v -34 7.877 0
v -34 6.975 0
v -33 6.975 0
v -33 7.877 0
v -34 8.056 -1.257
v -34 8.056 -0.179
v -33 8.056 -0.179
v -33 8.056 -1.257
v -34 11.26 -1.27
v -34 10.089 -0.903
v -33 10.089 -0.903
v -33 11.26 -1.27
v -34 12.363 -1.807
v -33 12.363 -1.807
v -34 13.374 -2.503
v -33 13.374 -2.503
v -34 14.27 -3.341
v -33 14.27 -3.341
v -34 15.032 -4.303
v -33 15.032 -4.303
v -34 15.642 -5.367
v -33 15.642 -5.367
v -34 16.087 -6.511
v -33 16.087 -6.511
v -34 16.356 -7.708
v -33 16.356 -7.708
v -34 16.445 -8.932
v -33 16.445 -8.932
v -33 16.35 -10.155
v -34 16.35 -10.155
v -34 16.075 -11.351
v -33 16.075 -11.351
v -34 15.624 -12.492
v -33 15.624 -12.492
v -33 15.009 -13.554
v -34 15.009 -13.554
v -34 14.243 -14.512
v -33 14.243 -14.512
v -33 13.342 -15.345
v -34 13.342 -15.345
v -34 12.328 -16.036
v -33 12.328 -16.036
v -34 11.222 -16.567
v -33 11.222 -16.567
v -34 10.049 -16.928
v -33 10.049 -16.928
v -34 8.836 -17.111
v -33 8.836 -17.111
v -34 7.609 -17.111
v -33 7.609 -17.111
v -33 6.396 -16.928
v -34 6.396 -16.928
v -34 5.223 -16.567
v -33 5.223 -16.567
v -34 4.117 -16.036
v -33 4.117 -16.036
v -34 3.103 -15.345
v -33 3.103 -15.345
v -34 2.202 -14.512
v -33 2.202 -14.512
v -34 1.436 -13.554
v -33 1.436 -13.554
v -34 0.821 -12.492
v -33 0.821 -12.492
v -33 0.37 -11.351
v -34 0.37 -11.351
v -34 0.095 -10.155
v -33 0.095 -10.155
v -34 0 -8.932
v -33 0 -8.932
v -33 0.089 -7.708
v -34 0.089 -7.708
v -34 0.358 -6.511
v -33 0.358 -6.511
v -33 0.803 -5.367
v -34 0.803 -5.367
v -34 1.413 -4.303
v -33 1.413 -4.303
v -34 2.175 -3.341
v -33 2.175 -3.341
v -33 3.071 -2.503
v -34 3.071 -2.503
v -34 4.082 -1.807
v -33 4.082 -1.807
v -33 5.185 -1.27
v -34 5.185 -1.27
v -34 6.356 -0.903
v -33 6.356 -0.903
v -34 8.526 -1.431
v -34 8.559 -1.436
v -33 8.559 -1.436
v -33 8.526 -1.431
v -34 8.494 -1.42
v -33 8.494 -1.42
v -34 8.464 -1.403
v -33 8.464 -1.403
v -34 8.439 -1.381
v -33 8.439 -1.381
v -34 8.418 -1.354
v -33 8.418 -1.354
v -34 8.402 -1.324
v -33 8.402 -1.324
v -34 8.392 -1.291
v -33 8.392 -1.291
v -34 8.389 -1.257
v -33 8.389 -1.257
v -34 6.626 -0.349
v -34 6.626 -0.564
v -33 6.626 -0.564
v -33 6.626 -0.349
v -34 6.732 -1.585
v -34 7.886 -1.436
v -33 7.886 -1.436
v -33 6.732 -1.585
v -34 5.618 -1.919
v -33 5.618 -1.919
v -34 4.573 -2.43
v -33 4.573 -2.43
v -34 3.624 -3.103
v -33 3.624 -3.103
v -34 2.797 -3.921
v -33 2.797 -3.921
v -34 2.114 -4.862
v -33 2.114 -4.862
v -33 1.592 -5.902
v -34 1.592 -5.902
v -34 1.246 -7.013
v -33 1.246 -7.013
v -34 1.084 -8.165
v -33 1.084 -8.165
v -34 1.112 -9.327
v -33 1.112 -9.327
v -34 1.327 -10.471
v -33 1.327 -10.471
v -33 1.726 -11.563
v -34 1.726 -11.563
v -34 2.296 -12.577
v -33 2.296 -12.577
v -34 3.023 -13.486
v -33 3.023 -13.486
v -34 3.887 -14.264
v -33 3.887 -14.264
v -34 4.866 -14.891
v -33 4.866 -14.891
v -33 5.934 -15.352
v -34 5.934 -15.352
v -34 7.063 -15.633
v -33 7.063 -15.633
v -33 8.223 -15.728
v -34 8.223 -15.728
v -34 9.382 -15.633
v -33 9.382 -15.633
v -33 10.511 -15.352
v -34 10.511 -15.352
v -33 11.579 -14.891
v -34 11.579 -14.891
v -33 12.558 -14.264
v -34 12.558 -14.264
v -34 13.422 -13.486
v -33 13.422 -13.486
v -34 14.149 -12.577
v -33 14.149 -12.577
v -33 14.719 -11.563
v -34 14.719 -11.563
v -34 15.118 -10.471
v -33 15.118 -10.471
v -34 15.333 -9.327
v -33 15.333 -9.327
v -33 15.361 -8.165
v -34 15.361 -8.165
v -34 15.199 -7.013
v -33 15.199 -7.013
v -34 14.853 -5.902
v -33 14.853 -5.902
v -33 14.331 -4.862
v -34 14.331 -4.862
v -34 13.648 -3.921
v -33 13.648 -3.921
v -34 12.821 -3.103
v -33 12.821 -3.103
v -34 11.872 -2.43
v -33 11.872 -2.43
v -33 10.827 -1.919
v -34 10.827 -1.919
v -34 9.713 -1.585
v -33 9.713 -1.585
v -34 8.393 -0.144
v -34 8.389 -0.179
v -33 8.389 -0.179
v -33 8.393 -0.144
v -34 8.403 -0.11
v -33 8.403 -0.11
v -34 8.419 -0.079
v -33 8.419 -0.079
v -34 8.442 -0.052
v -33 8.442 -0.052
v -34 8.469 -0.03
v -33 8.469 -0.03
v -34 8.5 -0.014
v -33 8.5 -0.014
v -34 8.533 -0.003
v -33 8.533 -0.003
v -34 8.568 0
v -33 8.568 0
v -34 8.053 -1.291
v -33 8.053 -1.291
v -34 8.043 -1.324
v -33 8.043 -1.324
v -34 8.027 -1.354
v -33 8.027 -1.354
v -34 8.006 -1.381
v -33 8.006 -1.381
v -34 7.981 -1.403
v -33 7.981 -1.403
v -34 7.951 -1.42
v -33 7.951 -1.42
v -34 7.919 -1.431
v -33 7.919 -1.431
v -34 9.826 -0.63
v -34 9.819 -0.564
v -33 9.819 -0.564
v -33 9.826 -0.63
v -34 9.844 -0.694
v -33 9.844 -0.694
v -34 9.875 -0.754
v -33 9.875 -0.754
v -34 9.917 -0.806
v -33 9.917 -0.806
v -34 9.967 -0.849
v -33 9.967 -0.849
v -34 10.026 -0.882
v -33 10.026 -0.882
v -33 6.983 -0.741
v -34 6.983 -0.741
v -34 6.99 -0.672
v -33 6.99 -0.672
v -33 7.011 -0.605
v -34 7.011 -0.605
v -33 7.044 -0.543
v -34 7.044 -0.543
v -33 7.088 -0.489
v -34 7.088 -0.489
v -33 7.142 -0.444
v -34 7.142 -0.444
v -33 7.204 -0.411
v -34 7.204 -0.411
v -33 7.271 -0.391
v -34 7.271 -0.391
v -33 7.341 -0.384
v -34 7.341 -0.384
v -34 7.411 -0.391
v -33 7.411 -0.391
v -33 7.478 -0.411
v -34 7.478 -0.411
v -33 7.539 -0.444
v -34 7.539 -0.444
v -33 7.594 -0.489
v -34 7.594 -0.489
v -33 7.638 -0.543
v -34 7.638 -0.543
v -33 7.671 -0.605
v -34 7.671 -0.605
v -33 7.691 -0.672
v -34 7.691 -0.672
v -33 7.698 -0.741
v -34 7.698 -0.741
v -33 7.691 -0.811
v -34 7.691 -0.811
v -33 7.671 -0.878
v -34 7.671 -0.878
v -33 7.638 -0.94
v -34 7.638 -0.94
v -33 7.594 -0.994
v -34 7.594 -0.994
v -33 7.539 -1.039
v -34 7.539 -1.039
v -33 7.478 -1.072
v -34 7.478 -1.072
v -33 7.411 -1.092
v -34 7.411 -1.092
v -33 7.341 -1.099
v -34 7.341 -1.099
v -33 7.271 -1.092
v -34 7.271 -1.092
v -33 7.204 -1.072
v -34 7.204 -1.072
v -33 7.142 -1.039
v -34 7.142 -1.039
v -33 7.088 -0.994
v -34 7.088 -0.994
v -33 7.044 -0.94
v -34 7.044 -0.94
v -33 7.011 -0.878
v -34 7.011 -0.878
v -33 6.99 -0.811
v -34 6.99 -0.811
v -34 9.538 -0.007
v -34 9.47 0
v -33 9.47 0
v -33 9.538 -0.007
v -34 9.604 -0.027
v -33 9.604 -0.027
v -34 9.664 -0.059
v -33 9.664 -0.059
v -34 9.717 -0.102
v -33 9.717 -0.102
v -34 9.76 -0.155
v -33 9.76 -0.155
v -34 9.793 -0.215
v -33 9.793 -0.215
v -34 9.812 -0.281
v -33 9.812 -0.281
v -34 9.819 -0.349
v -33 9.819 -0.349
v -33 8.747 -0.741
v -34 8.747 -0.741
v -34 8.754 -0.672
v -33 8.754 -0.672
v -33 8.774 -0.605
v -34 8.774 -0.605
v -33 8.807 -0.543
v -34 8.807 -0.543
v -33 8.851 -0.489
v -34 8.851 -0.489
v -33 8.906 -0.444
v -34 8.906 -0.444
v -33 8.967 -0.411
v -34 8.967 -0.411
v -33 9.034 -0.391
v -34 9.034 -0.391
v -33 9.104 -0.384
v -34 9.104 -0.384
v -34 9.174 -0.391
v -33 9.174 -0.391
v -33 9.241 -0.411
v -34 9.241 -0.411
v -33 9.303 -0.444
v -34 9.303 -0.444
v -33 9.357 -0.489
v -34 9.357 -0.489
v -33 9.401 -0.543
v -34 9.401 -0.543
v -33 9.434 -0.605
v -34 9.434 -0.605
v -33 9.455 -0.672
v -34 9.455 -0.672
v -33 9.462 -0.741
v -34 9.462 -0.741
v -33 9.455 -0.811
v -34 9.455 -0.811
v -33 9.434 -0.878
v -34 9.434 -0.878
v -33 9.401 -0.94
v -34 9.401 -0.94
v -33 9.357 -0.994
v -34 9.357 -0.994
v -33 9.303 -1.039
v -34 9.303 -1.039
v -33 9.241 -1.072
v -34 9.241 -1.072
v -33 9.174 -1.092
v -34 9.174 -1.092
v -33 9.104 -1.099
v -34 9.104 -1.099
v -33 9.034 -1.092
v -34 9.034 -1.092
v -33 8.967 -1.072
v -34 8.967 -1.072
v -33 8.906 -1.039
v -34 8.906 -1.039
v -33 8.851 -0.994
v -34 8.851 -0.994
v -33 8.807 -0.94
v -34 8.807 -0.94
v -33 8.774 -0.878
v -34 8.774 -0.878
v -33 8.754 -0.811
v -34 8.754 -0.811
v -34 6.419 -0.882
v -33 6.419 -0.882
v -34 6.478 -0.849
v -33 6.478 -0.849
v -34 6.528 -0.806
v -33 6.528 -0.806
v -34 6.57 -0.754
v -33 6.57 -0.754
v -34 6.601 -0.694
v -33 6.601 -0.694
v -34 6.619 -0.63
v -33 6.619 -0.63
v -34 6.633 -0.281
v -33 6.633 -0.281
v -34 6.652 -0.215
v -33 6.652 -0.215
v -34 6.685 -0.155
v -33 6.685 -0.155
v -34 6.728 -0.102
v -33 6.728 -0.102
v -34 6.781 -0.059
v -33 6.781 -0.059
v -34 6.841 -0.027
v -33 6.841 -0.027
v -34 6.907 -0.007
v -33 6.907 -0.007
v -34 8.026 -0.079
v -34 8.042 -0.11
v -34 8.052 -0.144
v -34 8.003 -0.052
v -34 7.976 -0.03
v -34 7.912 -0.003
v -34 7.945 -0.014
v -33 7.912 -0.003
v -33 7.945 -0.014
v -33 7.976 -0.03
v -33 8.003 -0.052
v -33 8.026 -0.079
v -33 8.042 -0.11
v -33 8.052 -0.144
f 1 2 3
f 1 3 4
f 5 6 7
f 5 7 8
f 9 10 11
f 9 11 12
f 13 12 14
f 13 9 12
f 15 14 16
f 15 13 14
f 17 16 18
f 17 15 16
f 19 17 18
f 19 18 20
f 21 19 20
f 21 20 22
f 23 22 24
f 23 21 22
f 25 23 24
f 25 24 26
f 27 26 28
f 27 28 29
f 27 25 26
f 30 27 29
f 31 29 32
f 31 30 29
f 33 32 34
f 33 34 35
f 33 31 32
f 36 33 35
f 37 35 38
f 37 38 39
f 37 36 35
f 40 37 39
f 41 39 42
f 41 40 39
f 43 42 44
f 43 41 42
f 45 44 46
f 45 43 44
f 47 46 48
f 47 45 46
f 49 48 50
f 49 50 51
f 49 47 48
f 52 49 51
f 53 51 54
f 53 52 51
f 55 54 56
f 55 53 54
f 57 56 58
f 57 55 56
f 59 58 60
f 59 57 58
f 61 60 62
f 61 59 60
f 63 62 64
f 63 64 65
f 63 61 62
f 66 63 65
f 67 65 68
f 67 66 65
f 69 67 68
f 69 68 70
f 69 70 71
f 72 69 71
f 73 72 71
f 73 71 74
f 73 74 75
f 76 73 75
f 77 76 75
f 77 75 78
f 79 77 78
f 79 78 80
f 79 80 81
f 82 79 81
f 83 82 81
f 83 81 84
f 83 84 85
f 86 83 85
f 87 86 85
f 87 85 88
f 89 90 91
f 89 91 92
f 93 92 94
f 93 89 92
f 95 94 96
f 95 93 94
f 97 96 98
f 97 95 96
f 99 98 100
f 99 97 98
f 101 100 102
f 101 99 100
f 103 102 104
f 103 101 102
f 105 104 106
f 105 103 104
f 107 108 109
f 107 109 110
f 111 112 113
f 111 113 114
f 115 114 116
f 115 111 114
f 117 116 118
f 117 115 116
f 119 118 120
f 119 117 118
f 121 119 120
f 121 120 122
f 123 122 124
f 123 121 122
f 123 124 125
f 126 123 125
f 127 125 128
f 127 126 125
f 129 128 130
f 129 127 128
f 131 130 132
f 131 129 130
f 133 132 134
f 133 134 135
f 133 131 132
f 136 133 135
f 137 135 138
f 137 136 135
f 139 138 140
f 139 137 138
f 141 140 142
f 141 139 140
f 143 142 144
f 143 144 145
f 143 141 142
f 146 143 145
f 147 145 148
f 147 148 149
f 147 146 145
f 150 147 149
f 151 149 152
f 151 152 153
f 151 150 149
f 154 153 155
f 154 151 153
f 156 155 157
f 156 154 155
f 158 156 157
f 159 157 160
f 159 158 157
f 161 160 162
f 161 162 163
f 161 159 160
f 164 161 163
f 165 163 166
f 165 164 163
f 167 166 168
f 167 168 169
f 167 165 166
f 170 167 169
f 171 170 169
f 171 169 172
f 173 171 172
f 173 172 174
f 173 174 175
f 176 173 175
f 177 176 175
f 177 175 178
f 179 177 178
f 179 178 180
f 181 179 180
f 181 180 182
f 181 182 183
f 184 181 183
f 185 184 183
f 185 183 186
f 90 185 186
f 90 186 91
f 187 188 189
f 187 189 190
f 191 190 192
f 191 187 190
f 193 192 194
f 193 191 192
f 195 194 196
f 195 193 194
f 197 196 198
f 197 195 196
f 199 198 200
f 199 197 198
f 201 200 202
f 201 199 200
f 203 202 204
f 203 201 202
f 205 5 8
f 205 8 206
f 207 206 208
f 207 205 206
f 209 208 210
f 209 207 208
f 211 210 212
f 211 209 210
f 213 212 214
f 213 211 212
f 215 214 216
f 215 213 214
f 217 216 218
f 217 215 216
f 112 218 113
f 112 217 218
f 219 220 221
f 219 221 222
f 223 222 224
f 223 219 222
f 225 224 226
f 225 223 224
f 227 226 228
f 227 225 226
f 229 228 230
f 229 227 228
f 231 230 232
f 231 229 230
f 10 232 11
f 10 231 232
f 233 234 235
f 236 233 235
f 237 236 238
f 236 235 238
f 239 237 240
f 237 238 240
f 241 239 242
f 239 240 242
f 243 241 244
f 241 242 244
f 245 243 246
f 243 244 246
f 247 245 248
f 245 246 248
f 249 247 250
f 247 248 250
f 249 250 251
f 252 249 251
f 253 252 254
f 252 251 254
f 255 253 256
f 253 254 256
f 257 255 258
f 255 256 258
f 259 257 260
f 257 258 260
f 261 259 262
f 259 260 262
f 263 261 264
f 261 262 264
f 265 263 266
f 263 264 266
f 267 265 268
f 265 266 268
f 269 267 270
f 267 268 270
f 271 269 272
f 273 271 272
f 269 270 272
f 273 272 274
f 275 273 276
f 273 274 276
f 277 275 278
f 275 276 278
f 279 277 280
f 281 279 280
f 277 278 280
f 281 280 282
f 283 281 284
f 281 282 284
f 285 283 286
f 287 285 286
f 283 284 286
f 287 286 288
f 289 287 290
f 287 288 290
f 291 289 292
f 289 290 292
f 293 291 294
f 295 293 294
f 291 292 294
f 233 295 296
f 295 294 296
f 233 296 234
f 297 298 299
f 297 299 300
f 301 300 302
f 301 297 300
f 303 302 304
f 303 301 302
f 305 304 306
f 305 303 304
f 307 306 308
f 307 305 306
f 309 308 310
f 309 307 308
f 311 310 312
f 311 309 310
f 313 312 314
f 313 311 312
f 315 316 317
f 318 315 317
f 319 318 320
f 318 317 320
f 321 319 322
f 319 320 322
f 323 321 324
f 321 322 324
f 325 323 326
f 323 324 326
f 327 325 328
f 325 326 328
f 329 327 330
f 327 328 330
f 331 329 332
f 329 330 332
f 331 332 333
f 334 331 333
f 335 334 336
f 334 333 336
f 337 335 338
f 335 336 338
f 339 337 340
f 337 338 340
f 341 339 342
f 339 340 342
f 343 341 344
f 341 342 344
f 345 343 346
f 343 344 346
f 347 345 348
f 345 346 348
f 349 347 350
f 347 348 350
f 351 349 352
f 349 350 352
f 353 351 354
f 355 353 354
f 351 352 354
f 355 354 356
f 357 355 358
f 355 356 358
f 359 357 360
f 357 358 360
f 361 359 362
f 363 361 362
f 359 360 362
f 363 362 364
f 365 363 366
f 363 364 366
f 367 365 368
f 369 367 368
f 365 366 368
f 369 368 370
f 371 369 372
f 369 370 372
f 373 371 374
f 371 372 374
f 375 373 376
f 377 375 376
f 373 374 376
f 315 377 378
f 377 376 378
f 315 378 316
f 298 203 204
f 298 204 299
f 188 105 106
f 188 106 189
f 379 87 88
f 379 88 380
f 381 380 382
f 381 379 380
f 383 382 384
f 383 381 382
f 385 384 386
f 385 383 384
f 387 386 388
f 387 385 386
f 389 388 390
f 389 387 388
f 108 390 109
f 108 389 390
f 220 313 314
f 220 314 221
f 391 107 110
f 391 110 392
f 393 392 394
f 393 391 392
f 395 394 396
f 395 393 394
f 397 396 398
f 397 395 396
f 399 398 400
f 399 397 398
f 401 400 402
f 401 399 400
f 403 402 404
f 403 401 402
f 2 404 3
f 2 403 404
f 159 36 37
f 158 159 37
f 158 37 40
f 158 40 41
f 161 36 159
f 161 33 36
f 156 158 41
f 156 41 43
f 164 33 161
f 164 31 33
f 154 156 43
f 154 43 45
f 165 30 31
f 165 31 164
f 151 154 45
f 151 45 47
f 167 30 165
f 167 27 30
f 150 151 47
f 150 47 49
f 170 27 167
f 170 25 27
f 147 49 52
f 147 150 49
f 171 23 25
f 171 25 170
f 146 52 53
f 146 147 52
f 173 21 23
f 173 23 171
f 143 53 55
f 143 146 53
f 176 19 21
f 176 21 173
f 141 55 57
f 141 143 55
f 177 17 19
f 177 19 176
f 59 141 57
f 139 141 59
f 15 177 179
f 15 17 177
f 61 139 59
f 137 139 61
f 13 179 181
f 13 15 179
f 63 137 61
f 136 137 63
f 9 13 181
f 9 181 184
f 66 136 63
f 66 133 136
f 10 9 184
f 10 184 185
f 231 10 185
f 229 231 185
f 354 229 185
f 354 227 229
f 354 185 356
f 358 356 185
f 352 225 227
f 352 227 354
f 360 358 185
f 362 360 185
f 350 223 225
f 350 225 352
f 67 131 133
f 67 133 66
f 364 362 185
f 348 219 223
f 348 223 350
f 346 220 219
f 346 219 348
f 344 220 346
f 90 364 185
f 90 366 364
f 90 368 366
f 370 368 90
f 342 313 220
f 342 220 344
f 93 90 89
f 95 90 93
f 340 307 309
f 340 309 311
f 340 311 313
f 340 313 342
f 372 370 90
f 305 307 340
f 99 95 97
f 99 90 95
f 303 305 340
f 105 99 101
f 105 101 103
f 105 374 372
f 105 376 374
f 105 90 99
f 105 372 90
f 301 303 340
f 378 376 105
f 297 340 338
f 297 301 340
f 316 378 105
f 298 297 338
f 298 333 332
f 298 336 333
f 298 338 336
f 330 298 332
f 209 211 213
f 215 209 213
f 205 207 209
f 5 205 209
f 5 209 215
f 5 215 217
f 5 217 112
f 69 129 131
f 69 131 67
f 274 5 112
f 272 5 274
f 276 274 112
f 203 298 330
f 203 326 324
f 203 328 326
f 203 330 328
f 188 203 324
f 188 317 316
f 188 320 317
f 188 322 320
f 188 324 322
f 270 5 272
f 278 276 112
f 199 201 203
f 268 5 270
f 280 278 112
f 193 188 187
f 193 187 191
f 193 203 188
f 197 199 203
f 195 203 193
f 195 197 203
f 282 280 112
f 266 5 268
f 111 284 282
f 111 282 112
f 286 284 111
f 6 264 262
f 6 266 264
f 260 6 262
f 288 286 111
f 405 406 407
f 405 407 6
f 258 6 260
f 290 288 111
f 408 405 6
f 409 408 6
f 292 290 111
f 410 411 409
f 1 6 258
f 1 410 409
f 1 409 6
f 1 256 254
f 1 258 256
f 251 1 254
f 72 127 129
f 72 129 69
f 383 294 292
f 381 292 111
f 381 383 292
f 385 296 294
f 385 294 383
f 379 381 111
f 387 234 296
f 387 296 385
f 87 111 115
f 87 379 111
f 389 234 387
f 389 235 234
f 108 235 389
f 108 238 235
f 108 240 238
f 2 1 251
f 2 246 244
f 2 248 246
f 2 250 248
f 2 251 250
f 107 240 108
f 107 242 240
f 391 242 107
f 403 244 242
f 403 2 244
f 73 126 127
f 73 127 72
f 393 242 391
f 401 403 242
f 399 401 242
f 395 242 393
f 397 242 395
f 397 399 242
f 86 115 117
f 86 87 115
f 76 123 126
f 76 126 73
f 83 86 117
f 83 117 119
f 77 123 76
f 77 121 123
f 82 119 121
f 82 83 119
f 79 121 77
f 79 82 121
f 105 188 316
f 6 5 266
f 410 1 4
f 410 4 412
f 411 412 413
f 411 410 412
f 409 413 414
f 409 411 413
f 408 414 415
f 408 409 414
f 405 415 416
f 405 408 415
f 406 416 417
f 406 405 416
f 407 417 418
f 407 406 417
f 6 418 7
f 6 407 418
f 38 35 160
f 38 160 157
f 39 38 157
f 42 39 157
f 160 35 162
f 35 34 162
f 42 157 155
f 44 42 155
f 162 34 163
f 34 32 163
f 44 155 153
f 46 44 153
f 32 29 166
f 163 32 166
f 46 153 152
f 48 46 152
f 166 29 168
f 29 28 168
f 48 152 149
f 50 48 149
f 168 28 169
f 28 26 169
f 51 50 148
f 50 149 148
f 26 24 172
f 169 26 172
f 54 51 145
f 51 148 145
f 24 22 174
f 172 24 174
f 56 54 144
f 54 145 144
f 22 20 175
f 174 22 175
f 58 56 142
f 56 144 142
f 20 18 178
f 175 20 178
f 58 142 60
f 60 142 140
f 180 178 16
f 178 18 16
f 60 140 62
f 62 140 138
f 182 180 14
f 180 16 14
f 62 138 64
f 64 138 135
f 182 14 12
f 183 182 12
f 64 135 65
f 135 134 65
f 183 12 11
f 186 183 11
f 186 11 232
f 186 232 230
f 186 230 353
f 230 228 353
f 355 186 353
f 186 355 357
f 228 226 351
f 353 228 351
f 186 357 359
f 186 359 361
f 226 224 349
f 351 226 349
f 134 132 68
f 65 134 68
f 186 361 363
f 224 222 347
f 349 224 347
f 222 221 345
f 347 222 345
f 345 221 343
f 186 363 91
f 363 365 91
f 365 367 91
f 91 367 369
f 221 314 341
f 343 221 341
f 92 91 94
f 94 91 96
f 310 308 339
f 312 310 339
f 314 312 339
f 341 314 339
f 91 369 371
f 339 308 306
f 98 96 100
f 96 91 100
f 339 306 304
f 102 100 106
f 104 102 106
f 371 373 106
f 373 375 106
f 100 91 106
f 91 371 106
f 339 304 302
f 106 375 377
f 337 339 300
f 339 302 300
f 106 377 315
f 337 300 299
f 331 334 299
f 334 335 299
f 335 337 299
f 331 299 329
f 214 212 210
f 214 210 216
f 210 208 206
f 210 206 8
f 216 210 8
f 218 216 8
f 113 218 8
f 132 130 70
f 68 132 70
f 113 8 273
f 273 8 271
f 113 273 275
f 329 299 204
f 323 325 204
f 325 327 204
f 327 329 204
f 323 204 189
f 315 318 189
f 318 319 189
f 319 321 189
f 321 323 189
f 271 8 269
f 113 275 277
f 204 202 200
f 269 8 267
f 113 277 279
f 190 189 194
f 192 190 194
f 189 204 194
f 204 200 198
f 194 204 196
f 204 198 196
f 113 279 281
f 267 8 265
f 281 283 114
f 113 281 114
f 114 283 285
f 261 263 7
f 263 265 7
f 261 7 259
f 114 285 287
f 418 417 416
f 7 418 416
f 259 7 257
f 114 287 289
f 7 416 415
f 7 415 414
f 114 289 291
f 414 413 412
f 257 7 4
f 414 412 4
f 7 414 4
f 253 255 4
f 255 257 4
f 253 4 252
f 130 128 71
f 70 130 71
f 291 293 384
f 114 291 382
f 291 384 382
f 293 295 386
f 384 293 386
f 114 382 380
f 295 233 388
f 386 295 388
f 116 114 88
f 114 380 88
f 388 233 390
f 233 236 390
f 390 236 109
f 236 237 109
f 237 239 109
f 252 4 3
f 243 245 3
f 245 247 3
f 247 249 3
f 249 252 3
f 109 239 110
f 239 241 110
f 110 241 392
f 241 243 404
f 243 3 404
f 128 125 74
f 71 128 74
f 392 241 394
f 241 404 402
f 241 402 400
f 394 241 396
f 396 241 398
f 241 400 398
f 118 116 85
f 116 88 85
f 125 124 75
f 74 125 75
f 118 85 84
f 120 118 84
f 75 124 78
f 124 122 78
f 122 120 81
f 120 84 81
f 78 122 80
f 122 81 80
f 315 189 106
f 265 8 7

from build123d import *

# Parameters (mm, degrees)
SKETCH_1_R      = 0.3575
EXTRUDE_1_DEPTH = 1


with BuildPart() as part:
    # Эскиз1 → Бобышка-Вытянуть1 (new body)
    with BuildSketch(Plane(origin=(-34, 0, 0), x_dir=(0, -1, 0), z_dir=(-1, 0, 0))):
        with BuildLine():
            Line((-8.389166667, -1.257451802), (-8.389166667, -0.17875))
            ThreePointArc((-8.389166667, -0.17875), (-8.44152133, -0.052354663), (-8.567916667, 0))
            Line((-8.567916667, 0), (-9.470386179, 0))
            ThreePointArc((-9.470386179, 0), (-9.717011227, -0.10215544), (-9.819166667, -0.348780488))
            Line((-9.819166667, -0.348780488), (-9.819166667, -0.563811004))
            ThreePointArc((-9.819166667, -0.563811004), (-9.894763543, -0.7806486), (-10.088783486, -0.903488707))
            ThreePointArc((-10.088783486, -0.903488707), (-8.2225, -17.133890567), (-6.356216514, -0.903488707))
            ThreePointArc((-6.356216514, -0.903488707), (-6.550236457, -0.7806486), (-6.625833333, -0.563811004))
            Line((-6.625833333, -0.563811004), (-6.625833333, -0.348780488))
            ThreePointArc((-6.625833333, -0.348780488), (-6.727988773, -0.10215544), (-6.974613821, 0))
            Line((-6.974613821, 0), (-7.877083333, 0))
            ThreePointArc((-7.877083333, 0), (-8.00347867, -0.052354663), (-8.055833333, -0.17875))
            Line((-8.055833333, -0.17875), (-8.055833333, -1.257451802))
            ThreePointArc((-8.055833333, -1.257451802), (-8.006422993, -1.380832575), (-7.88550813, -1.436003154))
            ThreePointArc((-7.88550813, -1.436003154), (-8.2225, -15.728057234), (-8.55949187, -1.436003154))
            ThreePointArc((-8.55949187, -1.436003154), (-8.438577007, -1.380832575), (-8.389166667, -1.257451802))
        make_face()
        with Locations((-9.104166667, -0.741312313)):
            Circle(SKETCH_1_R, mode=Mode.SUBTRACT)
        with Locations((-7.340833333, -0.741312313)):
            Circle(SKETCH_1_R, mode=Mode.SUBTRACT)
    extrude(amount=-EXTRUDE_1_DEPTH)


solid = part.part
